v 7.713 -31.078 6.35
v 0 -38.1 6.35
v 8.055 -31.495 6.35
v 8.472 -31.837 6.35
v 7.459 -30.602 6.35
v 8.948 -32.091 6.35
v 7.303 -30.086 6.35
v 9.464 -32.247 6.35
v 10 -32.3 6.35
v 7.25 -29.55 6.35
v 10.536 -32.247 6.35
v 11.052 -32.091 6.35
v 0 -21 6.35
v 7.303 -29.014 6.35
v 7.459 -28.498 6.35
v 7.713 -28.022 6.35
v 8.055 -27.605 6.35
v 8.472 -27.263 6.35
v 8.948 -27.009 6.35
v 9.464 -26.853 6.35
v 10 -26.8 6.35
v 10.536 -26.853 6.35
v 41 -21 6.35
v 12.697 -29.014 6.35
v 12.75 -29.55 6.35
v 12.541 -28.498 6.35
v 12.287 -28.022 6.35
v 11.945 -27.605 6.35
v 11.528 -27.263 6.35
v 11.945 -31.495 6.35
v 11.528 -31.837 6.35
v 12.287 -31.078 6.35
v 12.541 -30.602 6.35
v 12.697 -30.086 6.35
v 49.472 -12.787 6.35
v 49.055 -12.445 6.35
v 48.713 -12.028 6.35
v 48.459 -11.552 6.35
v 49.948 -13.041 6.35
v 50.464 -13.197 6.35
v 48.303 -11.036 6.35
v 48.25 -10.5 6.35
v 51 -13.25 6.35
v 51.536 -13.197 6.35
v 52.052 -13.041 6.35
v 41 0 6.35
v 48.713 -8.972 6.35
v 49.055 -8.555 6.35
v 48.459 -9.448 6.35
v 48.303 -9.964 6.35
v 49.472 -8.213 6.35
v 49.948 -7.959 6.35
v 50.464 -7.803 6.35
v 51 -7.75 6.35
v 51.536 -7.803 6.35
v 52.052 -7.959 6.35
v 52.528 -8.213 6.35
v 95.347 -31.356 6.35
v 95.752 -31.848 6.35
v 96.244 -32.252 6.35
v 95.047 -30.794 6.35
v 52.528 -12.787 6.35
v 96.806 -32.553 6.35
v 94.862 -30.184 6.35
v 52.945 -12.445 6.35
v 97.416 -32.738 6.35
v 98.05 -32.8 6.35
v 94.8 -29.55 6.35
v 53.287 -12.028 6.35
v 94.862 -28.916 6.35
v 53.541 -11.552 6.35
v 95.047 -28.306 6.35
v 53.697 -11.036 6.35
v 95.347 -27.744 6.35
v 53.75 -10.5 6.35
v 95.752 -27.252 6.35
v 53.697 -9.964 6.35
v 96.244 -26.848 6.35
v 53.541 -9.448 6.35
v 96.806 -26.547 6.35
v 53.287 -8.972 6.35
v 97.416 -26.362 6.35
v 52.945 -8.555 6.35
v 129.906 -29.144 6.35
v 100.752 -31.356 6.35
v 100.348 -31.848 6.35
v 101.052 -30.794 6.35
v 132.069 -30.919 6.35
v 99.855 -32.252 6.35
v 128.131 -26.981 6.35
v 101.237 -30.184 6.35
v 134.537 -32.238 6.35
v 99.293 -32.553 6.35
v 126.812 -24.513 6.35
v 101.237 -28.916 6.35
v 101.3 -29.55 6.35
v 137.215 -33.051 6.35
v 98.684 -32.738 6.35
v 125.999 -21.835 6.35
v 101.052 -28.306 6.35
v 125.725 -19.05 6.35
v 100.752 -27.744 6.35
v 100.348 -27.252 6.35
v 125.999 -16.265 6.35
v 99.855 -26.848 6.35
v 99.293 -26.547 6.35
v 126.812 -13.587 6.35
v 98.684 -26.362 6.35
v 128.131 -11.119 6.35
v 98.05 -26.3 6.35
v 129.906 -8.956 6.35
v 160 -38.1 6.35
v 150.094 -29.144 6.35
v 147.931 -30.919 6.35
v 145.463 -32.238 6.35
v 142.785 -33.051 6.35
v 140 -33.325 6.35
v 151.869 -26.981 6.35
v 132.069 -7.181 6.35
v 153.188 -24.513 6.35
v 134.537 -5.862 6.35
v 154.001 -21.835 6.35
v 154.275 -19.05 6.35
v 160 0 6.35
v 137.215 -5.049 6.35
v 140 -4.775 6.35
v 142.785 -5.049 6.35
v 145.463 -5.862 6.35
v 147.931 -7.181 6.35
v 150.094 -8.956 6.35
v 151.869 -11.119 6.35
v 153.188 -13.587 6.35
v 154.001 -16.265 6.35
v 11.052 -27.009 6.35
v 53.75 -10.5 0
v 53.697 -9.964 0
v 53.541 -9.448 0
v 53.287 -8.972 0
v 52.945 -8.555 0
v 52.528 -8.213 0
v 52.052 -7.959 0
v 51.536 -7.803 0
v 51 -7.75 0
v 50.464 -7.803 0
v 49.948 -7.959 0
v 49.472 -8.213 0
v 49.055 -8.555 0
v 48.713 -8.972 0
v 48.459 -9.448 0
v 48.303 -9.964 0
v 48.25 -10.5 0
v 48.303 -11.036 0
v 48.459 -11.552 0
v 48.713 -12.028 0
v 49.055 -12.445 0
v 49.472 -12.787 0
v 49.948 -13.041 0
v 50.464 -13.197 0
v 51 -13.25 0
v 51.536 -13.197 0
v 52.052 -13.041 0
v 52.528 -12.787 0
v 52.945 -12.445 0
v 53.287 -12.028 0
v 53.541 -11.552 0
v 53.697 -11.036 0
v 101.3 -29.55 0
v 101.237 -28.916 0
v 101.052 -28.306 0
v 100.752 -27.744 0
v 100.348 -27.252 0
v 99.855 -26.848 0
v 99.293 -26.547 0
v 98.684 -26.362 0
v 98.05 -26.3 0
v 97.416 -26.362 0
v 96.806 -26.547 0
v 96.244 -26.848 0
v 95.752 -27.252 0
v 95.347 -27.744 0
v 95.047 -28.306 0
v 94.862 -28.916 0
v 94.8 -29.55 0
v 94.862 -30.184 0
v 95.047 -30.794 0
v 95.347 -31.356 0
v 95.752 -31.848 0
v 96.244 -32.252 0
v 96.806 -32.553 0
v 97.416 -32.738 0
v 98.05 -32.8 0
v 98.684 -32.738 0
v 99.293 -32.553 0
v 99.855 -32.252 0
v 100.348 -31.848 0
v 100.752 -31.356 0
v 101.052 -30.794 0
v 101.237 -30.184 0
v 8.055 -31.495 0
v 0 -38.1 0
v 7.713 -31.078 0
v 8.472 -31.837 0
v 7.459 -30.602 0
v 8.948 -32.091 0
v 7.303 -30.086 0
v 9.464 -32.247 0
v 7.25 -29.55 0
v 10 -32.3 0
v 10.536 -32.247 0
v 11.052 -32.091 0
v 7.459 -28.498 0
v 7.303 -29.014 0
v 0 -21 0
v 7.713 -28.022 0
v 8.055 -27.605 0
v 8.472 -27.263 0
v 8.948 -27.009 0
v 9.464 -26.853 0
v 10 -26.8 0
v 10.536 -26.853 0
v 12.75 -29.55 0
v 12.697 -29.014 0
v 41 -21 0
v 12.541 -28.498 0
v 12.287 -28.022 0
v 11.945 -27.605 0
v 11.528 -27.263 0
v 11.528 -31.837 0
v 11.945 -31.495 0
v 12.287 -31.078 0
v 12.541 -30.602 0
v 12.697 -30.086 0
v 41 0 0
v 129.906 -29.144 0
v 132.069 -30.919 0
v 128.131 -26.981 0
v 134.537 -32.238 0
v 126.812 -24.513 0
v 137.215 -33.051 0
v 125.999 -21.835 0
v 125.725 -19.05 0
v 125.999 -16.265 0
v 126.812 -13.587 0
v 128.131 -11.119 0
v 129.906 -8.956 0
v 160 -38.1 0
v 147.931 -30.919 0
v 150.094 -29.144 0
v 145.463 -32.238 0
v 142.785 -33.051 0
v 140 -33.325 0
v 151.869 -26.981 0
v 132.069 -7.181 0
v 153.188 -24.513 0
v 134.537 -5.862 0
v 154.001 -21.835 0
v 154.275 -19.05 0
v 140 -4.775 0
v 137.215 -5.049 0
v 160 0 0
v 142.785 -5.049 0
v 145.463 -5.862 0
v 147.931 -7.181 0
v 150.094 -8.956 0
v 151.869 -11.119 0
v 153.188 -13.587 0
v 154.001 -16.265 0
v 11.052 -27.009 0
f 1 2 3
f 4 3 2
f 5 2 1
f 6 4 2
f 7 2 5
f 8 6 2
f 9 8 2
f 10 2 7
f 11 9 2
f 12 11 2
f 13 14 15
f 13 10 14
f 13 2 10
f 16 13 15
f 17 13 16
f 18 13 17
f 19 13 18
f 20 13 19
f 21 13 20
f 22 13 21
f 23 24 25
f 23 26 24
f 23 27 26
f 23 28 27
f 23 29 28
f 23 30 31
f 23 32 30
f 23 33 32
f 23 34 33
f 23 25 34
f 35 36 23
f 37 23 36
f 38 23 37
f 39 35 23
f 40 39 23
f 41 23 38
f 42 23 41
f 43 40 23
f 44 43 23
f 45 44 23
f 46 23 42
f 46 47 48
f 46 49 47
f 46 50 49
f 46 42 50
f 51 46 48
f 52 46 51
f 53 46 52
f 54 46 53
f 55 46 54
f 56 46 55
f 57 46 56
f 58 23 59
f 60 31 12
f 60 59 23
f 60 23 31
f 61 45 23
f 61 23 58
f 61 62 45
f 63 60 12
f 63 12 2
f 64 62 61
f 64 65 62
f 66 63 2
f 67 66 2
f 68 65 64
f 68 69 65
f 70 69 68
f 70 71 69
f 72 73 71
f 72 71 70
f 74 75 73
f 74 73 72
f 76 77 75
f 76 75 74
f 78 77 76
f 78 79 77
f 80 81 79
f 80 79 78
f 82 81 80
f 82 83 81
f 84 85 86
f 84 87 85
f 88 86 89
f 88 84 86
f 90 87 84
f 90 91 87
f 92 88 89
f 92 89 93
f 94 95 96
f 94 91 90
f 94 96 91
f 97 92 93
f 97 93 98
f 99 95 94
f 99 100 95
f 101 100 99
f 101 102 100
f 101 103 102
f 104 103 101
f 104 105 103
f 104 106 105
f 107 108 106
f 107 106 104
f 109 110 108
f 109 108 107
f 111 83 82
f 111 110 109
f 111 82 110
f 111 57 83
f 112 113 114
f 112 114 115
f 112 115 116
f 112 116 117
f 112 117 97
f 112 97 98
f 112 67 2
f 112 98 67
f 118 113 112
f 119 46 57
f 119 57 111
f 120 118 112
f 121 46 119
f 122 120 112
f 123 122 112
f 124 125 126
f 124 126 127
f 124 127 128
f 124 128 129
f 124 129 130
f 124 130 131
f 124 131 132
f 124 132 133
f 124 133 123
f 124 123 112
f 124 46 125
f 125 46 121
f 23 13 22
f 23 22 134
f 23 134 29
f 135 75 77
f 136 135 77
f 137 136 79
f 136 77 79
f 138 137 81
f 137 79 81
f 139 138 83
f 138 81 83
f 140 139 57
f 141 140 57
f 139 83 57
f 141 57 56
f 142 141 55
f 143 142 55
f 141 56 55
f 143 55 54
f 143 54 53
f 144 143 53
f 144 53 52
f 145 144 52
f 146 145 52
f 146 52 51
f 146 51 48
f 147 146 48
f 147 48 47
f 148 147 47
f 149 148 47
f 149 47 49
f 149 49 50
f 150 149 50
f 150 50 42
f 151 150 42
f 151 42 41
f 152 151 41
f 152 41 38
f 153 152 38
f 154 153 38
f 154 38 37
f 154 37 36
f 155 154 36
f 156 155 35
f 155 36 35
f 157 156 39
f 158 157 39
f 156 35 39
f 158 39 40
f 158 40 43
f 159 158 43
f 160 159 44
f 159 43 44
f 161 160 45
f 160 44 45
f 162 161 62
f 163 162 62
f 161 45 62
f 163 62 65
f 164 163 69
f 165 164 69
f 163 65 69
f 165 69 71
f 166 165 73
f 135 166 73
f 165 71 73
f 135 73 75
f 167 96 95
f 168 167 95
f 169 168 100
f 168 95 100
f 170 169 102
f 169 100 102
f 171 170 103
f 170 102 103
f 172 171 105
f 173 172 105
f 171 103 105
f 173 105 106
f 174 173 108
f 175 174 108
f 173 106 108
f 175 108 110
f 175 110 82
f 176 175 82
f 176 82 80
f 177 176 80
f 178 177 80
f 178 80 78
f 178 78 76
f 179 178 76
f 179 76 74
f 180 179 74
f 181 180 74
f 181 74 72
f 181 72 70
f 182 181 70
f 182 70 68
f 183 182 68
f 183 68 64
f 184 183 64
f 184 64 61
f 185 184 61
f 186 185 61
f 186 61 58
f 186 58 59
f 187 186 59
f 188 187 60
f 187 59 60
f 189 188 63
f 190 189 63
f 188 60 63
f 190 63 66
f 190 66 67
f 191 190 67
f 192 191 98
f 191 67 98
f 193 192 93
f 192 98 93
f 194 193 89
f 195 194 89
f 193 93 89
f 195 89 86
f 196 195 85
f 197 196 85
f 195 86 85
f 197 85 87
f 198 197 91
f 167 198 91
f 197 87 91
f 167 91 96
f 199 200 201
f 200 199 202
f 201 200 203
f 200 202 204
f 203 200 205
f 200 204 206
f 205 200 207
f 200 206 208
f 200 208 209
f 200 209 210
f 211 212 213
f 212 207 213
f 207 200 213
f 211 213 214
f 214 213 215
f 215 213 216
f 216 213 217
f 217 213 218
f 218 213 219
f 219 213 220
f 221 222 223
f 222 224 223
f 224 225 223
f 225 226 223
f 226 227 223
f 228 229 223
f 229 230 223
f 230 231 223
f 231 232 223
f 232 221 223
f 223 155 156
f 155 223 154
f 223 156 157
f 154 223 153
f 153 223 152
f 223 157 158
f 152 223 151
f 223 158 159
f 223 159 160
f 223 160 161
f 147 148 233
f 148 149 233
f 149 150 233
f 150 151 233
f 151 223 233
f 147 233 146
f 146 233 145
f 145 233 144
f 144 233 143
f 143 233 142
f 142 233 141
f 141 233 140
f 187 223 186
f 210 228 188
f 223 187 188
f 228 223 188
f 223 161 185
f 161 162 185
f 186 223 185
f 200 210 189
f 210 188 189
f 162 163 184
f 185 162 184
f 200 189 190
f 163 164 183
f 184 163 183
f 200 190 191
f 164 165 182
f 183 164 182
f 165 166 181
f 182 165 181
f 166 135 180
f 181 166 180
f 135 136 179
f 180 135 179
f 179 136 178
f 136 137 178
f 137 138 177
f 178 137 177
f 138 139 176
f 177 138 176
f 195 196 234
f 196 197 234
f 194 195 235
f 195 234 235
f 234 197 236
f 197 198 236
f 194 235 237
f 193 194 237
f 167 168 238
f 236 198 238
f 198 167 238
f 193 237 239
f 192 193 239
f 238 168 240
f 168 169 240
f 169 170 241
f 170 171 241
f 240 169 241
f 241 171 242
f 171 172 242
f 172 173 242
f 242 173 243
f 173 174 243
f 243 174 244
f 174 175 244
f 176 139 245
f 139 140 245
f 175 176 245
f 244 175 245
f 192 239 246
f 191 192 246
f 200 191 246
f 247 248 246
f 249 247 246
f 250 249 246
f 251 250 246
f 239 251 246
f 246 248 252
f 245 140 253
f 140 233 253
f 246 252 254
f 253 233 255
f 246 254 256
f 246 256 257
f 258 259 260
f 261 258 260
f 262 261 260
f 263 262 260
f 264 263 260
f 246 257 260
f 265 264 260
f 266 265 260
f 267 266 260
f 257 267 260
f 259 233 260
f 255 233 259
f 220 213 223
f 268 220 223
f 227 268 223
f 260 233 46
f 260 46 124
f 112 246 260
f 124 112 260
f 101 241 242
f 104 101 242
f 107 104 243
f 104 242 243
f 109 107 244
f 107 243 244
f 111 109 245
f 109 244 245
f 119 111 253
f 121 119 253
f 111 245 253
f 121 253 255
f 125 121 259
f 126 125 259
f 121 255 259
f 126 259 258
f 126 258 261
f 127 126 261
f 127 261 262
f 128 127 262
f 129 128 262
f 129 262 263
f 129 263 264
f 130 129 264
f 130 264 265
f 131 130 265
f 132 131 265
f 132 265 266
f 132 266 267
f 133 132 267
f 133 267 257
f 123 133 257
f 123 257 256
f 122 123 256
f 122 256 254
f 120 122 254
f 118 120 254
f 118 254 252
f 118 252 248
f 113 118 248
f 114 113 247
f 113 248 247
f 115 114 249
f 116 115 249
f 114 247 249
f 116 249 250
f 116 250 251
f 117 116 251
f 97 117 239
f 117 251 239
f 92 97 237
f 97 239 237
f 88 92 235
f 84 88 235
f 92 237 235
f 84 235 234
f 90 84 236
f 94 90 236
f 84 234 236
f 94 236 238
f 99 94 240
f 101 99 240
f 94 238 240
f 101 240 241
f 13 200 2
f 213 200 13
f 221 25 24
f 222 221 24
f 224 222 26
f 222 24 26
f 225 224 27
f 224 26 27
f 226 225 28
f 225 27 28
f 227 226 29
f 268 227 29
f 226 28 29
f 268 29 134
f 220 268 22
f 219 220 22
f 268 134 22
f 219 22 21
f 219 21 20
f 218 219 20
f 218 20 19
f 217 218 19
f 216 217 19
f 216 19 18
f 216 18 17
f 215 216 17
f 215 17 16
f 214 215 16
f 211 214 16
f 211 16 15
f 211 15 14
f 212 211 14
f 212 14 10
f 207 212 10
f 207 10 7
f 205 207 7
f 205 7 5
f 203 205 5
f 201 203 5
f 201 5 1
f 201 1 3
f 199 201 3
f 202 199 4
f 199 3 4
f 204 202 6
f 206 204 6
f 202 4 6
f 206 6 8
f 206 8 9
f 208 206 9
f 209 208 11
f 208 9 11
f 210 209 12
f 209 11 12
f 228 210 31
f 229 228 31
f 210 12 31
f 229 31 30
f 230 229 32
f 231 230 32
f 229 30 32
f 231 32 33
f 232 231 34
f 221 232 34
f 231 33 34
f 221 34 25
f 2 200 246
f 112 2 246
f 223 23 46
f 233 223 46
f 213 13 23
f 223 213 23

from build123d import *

# Parameters (mm, degrees)
SKETCH1_W           = 160
SKETCH1_H           = 38.1
BOSS_EXTRUDE1_DEPTH = 6.35
SKETCH2_R           = 14.275
CUT_EXTRUDE1_DEPTH  = 7.35
SKETCH3_W           = 41
SKETCH3_H           = 21
CUT_EXTRUDE2_DEPTH  = 7.35
SKETCH4_R           = 2.75
SKETCH4_R_2         = 3.25
CUT_EXTRUDE3_DEPTH  = 7.35


with BuildPart() as part:
    # Sketch1 → Boss-Extrude1 (new body)
    with BuildSketch(Plane.XY):
        with Locations((80, -19.05)):
            Rectangle(SKETCH1_W, SKETCH1_H)
    extrude(amount=BOSS_EXTRUDE1_DEPTH)

    # Sketch2 → Cut-Extrude1 (cut, through all)
    with BuildSketch(Plane(origin=(0, 0, 0), x_dir=(-1, 0, 0), z_dir=(0, 0, -1))):
        with Locations((-140, -19.05)):
            Circle(SKETCH2_R)
    extrude(amount=-CUT_EXTRUDE1_DEPTH, mode=Mode.SUBTRACT)

    # Sketch3 → Cut-Extrude2 (cut, through all)
    with BuildSketch(Plane.XY.offset(6.35)):
        with Locations((20.5, -10.5)):
            Rectangle(SKETCH3_W, SKETCH3_H)
    extrude(amount=-CUT_EXTRUDE2_DEPTH, mode=Mode.SUBTRACT)

    # Sketch4 → Cut-Extrude3 (cut, through all)
    with BuildSketch(Plane.XY.offset(6.35)):
        with Locations((10, -29.55)):
            Circle(SKETCH4_R)
        with Locations((51, -10.5)):
            Circle(SKETCH4_R)
        with Locations((98.049601269, -29.55)):
            Circle(SKETCH4_R_2)
    extrude(amount=-CUT_EXTRUDE3_DEPTH, mode=Mode.SUBTRACT)


solid = part.part
